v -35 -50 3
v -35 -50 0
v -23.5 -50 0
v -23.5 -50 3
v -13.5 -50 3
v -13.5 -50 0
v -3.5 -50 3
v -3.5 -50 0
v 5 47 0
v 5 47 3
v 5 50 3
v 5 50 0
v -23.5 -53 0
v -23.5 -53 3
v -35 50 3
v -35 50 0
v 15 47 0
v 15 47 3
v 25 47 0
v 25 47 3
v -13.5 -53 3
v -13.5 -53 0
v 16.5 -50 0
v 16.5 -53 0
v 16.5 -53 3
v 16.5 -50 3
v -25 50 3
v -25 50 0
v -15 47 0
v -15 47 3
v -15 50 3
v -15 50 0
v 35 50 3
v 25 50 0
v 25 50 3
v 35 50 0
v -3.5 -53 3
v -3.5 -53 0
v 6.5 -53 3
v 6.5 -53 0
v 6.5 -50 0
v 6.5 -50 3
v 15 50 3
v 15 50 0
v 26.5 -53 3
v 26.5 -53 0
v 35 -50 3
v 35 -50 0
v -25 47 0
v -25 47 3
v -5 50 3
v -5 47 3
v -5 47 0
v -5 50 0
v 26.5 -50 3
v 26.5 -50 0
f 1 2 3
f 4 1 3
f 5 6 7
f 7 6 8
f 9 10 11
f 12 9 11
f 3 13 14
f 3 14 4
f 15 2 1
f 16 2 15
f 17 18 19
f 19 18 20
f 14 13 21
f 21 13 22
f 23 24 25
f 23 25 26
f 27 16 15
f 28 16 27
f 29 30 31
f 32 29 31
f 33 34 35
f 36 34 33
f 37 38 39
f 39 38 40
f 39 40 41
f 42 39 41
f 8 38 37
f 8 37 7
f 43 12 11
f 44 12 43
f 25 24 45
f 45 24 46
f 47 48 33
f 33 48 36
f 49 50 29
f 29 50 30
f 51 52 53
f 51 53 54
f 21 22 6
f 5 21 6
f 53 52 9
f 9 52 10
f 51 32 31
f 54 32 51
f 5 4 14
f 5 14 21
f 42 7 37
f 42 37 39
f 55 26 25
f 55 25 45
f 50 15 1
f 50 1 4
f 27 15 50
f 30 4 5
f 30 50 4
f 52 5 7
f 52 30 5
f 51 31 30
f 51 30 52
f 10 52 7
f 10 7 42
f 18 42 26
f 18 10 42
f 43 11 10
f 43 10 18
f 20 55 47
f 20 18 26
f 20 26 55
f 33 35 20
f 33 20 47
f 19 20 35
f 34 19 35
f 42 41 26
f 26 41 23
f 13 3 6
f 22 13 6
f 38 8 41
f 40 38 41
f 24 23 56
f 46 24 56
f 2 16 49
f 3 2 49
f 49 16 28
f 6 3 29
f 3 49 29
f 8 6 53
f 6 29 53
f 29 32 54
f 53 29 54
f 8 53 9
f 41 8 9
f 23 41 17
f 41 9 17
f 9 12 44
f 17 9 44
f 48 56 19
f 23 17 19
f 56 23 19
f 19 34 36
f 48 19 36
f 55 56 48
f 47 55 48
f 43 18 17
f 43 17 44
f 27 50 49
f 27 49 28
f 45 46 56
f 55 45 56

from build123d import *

# Parameters (mm, degrees)
SKETCH1_W           = 70
SKETCH1_H           = 100
SKETCH1_W_2         = 10
SKETCH1_H_2         = 3
BOSS_EXTRUDE1_DEPTH = 3
SKETCH2_W           = 10
SKETCH2_H           = 3
CUT_EXTRUDE1_DEPTH  = 64.584589328


with BuildPart() as part:
    # Sketch1 → Boss-Extrude1 (new body)
    with BuildSketch(Plane.XY):
        Rectangle(SKETCH1_W, SKETCH1_H)
        with Locations((21.5, -51.5)):
            Rectangle(SKETCH1_W_2, SKETCH1_H_2)
        with Locations((1.5, -51.5)):
            Rectangle(SKETCH1_W_2, SKETCH1_H_2)
        with Locations((-18.5, -51.5)):
            Rectangle(SKETCH1_W_2, SKETCH1_H_2)
    extrude(amount=BOSS_EXTRUDE1_DEPTH)

    # Sketch2 → Cut-Extrude1 (cut, through all)
    with BuildSketch(Plane.XY.offset(3)):
        with Locations((-20, 48.5)):
            Rectangle(SKETCH2_W, SKETCH2_H)
        with Locations((0, 48.5)):
            Rectangle(SKETCH2_W, SKETCH2_H)
        with Locations((20, 48.5)):
            Rectangle(SKETCH2_W, SKETCH2_H)
    extrude(amount=-CUT_EXTRUDE1_DEPTH, mode=Mode.SUBTRACT)


solid = part.part
